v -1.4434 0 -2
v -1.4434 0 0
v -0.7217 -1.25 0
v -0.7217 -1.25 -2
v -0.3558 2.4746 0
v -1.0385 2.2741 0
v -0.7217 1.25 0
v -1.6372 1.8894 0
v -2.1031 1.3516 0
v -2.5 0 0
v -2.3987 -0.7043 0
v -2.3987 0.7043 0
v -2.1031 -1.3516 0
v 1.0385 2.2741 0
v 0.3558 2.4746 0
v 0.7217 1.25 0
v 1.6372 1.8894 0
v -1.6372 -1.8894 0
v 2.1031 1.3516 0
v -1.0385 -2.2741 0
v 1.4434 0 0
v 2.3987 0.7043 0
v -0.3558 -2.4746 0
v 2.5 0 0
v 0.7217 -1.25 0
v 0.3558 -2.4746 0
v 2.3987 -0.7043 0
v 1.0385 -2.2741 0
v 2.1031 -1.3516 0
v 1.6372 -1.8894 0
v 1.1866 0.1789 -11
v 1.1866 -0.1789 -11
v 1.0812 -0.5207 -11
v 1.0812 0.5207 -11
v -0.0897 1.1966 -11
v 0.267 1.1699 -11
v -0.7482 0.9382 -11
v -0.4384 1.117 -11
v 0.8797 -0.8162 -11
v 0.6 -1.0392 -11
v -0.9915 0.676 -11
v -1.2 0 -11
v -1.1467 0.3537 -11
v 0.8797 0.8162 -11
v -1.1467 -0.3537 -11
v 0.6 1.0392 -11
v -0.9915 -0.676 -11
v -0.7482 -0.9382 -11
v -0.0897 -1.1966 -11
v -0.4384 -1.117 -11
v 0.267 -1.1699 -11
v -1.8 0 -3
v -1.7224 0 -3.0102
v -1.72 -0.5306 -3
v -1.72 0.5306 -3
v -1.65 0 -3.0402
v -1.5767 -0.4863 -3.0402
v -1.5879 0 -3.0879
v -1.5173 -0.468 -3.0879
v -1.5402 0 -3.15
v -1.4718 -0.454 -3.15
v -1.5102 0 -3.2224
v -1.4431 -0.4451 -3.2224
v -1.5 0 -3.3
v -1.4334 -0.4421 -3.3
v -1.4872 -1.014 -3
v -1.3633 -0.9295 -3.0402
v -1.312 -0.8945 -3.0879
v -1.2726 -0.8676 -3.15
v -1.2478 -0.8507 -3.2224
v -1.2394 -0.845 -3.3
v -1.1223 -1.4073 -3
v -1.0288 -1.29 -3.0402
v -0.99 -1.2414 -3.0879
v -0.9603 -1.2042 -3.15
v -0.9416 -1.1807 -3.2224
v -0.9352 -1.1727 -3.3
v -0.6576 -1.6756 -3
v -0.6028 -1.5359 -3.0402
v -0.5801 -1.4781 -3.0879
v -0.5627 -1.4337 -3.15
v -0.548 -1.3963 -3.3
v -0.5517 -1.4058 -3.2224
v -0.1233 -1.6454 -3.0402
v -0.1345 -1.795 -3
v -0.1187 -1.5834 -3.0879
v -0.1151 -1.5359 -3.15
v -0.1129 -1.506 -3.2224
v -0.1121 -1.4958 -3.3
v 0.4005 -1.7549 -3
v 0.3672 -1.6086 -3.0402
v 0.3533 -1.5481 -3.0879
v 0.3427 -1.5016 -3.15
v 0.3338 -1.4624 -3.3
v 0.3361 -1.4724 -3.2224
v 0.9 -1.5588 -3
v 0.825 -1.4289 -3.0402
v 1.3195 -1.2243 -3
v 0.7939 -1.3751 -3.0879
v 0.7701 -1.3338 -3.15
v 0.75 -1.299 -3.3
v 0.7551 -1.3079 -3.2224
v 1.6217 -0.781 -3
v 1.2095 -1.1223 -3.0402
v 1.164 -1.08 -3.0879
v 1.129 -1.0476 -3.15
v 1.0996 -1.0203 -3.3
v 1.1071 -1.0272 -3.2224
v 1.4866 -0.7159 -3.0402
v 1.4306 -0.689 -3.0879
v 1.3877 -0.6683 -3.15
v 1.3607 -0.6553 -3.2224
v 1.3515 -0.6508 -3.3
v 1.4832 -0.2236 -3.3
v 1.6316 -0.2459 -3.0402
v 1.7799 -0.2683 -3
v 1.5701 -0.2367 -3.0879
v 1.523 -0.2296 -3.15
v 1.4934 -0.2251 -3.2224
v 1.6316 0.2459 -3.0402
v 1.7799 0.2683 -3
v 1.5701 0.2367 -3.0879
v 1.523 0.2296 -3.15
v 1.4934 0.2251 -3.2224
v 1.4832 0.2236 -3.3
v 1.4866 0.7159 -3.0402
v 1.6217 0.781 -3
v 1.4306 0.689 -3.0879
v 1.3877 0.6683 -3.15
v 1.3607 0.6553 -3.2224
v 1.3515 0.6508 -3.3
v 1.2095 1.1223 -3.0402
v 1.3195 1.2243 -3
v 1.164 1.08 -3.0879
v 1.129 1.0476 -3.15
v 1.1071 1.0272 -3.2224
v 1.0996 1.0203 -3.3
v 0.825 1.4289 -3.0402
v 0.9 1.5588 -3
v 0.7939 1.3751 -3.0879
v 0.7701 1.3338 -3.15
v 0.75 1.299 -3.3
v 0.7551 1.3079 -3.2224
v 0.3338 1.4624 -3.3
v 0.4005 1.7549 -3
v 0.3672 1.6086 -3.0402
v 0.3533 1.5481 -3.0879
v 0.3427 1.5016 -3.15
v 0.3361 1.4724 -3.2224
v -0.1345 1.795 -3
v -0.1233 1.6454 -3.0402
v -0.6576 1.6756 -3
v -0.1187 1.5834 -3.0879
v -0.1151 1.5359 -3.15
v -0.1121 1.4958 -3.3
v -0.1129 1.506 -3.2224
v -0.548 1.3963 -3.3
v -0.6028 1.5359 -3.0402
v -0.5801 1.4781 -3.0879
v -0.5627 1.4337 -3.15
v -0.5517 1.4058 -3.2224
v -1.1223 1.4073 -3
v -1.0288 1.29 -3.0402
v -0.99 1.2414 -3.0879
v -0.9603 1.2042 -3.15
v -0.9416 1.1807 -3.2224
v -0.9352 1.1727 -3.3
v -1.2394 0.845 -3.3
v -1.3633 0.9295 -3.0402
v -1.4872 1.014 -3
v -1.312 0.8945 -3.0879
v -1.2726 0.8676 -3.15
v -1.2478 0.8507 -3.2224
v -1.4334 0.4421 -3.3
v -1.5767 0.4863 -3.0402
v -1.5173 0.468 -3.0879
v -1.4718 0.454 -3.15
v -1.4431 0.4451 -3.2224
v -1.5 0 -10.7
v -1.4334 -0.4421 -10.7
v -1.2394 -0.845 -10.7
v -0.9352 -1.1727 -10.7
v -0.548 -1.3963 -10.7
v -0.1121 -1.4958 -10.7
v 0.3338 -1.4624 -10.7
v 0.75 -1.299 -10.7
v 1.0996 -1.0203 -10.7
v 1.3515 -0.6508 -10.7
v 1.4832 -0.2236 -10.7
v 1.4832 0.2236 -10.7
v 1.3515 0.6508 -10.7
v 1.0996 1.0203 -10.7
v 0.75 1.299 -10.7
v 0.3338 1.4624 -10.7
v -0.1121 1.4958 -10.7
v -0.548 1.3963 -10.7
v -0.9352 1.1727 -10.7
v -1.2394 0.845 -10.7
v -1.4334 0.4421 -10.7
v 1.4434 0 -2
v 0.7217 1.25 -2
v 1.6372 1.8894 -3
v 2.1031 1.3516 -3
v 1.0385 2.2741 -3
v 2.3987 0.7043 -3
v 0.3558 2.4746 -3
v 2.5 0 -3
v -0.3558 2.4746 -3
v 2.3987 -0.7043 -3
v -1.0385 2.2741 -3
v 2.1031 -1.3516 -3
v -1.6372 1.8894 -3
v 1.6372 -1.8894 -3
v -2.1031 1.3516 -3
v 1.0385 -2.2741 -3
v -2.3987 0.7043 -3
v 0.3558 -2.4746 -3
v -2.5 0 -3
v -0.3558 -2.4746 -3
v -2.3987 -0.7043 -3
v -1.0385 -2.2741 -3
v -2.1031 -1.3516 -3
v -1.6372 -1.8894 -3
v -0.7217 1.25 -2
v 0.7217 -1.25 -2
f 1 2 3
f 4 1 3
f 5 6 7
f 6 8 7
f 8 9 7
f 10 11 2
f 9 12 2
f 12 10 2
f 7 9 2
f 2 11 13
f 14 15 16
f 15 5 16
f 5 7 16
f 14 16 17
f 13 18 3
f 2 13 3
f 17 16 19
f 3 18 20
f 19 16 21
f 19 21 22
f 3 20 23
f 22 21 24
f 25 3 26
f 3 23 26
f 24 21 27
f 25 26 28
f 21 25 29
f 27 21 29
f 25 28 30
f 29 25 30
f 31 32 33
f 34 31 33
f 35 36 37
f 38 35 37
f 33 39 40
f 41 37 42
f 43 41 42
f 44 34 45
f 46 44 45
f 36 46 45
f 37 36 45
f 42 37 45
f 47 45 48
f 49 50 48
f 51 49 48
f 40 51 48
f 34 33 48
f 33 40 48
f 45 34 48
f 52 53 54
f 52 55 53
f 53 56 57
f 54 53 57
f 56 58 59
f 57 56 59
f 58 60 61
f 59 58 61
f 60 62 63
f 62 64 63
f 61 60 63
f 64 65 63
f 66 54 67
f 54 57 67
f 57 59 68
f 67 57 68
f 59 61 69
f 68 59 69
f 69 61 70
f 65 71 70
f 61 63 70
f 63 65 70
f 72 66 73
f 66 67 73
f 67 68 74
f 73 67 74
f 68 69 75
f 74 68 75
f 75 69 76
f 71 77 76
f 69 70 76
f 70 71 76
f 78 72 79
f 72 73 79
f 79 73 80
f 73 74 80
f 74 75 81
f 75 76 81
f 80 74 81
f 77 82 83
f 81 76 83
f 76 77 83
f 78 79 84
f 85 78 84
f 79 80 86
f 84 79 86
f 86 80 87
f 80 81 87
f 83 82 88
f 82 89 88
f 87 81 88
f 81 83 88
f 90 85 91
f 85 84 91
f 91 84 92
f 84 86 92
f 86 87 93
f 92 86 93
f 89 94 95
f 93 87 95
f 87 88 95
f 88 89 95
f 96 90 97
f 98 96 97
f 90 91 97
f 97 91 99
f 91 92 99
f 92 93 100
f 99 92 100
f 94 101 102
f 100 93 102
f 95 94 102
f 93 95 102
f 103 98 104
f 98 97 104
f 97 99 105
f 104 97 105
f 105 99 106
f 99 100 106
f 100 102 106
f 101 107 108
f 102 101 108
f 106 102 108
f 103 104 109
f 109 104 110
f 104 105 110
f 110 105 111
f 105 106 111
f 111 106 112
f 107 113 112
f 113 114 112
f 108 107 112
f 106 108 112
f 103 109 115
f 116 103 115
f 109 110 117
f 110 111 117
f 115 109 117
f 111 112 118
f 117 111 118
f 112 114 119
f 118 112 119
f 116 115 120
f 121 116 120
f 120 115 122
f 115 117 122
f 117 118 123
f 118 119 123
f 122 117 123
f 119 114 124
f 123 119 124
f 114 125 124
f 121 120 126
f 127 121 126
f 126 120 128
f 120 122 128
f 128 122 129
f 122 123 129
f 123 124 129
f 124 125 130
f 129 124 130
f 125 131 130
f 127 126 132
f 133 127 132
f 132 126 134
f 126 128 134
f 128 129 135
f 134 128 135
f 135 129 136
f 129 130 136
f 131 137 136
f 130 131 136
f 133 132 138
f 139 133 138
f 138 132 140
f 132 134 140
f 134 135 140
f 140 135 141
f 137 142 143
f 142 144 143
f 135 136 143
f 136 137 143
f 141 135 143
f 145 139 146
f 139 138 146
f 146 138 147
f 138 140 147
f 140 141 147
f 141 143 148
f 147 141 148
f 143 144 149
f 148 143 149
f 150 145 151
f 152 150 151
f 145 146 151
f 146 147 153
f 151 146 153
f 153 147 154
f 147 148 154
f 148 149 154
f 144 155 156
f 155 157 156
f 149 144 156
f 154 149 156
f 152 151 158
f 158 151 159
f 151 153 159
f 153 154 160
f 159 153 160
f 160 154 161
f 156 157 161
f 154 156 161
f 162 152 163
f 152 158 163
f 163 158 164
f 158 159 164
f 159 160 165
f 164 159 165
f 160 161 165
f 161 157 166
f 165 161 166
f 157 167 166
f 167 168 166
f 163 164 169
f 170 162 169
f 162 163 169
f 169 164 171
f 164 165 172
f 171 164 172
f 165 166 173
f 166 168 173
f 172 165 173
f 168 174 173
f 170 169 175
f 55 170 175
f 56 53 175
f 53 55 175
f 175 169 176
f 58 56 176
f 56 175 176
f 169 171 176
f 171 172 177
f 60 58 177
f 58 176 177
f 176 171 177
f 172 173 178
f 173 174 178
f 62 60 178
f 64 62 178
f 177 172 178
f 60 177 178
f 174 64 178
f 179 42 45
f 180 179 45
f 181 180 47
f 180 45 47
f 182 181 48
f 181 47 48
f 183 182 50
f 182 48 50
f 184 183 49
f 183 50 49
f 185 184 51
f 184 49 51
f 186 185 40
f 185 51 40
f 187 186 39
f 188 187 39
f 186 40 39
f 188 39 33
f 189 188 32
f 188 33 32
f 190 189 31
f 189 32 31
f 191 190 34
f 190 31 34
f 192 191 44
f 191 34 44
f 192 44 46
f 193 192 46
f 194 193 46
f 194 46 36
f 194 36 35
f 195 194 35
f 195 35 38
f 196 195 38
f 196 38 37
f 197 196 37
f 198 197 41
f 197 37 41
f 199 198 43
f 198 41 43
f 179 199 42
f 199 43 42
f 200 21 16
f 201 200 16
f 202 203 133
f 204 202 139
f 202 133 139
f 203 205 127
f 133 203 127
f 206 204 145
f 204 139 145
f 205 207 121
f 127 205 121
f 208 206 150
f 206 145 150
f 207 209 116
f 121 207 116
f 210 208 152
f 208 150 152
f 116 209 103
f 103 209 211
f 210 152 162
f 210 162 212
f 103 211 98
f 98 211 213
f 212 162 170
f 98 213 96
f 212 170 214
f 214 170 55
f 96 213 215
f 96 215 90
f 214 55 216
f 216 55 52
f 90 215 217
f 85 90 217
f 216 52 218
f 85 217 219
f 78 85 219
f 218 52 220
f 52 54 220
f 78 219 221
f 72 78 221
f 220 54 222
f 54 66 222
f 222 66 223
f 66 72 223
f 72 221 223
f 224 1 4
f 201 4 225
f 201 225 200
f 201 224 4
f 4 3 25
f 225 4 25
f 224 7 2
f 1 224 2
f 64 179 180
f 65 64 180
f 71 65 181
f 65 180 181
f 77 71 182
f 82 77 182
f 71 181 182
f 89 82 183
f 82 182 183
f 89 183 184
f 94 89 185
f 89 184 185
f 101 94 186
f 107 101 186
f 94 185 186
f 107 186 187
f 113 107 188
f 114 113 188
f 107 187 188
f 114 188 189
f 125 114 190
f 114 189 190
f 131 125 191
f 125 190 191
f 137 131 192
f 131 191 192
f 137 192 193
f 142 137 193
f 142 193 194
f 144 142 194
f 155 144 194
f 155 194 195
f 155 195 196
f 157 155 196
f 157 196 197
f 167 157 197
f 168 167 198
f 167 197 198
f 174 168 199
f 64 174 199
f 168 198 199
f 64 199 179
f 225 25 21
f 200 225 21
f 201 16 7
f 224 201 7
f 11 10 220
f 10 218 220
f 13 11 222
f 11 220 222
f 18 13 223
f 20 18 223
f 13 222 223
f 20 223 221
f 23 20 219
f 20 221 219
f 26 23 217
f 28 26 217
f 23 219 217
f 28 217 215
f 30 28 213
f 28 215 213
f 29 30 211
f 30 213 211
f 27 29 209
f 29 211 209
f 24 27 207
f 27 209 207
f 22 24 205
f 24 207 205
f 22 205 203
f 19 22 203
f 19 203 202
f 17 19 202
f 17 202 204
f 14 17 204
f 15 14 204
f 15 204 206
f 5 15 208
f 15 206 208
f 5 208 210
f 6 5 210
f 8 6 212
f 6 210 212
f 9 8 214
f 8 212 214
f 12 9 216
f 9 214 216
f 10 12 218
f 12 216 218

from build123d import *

# Parameters (mm, degrees)
CUT_EXTRUDE_1_DEPTH = 2
FILLET_1_R          = 0.3
CHAMFER_1_SIZE      = 0.3


with BuildPart() as part:
    # Эскиз1 → Повернуть1 (revolve)
    with BuildSketch(Plane(origin=(0, 0, 0), x_dir=(0, 0, -1), z_dir=(1, 0, 0)), mode=Mode.PRIVATE) as revolve_1_sk:
        Polygon((0, 0), (0, 2.5), (3, 2.5), (3, 1.5), (11, 1.5), (11, 0), align=None)
    revolve(revolve_1_sk.sketch.rotate(Axis((0, 0, 0), (0, 0, 1)), 90), axis=Axis((0, 0, 0), (0, 0, 1)))

    # Эскиз2 → Вырез-Вытянуть1 (cut)
    with BuildSketch(Plane.XY):
        Polygon((1.443375673, 0), (0.721687836, 1.25), (-0.721687836, 1.25), (-1.443375673, 0), (-0.721687836, -1.25), (0.721687836, -1.25), align=None)
    extrude(amount=-CUT_EXTRUDE_1_DEPTH, mode=Mode.SUBTRACT)

    # Скругление1
    fillet_1_edges = [part.edges().sort_by_distance(p)[0] for p in [
        (1.5, 0, -3),
    ]]
    fillet(fillet_1_edges, radius=FILLET_1_R)

    # Фаска1
    chamfer_1_edges = [part.edges().sort_by_distance(p)[0] for p in [
        (1.5, 0, -11),
    ]]
    chamfer(chamfer_1_edges, length=CHAMFER_1_SIZE)


solid = part.part
